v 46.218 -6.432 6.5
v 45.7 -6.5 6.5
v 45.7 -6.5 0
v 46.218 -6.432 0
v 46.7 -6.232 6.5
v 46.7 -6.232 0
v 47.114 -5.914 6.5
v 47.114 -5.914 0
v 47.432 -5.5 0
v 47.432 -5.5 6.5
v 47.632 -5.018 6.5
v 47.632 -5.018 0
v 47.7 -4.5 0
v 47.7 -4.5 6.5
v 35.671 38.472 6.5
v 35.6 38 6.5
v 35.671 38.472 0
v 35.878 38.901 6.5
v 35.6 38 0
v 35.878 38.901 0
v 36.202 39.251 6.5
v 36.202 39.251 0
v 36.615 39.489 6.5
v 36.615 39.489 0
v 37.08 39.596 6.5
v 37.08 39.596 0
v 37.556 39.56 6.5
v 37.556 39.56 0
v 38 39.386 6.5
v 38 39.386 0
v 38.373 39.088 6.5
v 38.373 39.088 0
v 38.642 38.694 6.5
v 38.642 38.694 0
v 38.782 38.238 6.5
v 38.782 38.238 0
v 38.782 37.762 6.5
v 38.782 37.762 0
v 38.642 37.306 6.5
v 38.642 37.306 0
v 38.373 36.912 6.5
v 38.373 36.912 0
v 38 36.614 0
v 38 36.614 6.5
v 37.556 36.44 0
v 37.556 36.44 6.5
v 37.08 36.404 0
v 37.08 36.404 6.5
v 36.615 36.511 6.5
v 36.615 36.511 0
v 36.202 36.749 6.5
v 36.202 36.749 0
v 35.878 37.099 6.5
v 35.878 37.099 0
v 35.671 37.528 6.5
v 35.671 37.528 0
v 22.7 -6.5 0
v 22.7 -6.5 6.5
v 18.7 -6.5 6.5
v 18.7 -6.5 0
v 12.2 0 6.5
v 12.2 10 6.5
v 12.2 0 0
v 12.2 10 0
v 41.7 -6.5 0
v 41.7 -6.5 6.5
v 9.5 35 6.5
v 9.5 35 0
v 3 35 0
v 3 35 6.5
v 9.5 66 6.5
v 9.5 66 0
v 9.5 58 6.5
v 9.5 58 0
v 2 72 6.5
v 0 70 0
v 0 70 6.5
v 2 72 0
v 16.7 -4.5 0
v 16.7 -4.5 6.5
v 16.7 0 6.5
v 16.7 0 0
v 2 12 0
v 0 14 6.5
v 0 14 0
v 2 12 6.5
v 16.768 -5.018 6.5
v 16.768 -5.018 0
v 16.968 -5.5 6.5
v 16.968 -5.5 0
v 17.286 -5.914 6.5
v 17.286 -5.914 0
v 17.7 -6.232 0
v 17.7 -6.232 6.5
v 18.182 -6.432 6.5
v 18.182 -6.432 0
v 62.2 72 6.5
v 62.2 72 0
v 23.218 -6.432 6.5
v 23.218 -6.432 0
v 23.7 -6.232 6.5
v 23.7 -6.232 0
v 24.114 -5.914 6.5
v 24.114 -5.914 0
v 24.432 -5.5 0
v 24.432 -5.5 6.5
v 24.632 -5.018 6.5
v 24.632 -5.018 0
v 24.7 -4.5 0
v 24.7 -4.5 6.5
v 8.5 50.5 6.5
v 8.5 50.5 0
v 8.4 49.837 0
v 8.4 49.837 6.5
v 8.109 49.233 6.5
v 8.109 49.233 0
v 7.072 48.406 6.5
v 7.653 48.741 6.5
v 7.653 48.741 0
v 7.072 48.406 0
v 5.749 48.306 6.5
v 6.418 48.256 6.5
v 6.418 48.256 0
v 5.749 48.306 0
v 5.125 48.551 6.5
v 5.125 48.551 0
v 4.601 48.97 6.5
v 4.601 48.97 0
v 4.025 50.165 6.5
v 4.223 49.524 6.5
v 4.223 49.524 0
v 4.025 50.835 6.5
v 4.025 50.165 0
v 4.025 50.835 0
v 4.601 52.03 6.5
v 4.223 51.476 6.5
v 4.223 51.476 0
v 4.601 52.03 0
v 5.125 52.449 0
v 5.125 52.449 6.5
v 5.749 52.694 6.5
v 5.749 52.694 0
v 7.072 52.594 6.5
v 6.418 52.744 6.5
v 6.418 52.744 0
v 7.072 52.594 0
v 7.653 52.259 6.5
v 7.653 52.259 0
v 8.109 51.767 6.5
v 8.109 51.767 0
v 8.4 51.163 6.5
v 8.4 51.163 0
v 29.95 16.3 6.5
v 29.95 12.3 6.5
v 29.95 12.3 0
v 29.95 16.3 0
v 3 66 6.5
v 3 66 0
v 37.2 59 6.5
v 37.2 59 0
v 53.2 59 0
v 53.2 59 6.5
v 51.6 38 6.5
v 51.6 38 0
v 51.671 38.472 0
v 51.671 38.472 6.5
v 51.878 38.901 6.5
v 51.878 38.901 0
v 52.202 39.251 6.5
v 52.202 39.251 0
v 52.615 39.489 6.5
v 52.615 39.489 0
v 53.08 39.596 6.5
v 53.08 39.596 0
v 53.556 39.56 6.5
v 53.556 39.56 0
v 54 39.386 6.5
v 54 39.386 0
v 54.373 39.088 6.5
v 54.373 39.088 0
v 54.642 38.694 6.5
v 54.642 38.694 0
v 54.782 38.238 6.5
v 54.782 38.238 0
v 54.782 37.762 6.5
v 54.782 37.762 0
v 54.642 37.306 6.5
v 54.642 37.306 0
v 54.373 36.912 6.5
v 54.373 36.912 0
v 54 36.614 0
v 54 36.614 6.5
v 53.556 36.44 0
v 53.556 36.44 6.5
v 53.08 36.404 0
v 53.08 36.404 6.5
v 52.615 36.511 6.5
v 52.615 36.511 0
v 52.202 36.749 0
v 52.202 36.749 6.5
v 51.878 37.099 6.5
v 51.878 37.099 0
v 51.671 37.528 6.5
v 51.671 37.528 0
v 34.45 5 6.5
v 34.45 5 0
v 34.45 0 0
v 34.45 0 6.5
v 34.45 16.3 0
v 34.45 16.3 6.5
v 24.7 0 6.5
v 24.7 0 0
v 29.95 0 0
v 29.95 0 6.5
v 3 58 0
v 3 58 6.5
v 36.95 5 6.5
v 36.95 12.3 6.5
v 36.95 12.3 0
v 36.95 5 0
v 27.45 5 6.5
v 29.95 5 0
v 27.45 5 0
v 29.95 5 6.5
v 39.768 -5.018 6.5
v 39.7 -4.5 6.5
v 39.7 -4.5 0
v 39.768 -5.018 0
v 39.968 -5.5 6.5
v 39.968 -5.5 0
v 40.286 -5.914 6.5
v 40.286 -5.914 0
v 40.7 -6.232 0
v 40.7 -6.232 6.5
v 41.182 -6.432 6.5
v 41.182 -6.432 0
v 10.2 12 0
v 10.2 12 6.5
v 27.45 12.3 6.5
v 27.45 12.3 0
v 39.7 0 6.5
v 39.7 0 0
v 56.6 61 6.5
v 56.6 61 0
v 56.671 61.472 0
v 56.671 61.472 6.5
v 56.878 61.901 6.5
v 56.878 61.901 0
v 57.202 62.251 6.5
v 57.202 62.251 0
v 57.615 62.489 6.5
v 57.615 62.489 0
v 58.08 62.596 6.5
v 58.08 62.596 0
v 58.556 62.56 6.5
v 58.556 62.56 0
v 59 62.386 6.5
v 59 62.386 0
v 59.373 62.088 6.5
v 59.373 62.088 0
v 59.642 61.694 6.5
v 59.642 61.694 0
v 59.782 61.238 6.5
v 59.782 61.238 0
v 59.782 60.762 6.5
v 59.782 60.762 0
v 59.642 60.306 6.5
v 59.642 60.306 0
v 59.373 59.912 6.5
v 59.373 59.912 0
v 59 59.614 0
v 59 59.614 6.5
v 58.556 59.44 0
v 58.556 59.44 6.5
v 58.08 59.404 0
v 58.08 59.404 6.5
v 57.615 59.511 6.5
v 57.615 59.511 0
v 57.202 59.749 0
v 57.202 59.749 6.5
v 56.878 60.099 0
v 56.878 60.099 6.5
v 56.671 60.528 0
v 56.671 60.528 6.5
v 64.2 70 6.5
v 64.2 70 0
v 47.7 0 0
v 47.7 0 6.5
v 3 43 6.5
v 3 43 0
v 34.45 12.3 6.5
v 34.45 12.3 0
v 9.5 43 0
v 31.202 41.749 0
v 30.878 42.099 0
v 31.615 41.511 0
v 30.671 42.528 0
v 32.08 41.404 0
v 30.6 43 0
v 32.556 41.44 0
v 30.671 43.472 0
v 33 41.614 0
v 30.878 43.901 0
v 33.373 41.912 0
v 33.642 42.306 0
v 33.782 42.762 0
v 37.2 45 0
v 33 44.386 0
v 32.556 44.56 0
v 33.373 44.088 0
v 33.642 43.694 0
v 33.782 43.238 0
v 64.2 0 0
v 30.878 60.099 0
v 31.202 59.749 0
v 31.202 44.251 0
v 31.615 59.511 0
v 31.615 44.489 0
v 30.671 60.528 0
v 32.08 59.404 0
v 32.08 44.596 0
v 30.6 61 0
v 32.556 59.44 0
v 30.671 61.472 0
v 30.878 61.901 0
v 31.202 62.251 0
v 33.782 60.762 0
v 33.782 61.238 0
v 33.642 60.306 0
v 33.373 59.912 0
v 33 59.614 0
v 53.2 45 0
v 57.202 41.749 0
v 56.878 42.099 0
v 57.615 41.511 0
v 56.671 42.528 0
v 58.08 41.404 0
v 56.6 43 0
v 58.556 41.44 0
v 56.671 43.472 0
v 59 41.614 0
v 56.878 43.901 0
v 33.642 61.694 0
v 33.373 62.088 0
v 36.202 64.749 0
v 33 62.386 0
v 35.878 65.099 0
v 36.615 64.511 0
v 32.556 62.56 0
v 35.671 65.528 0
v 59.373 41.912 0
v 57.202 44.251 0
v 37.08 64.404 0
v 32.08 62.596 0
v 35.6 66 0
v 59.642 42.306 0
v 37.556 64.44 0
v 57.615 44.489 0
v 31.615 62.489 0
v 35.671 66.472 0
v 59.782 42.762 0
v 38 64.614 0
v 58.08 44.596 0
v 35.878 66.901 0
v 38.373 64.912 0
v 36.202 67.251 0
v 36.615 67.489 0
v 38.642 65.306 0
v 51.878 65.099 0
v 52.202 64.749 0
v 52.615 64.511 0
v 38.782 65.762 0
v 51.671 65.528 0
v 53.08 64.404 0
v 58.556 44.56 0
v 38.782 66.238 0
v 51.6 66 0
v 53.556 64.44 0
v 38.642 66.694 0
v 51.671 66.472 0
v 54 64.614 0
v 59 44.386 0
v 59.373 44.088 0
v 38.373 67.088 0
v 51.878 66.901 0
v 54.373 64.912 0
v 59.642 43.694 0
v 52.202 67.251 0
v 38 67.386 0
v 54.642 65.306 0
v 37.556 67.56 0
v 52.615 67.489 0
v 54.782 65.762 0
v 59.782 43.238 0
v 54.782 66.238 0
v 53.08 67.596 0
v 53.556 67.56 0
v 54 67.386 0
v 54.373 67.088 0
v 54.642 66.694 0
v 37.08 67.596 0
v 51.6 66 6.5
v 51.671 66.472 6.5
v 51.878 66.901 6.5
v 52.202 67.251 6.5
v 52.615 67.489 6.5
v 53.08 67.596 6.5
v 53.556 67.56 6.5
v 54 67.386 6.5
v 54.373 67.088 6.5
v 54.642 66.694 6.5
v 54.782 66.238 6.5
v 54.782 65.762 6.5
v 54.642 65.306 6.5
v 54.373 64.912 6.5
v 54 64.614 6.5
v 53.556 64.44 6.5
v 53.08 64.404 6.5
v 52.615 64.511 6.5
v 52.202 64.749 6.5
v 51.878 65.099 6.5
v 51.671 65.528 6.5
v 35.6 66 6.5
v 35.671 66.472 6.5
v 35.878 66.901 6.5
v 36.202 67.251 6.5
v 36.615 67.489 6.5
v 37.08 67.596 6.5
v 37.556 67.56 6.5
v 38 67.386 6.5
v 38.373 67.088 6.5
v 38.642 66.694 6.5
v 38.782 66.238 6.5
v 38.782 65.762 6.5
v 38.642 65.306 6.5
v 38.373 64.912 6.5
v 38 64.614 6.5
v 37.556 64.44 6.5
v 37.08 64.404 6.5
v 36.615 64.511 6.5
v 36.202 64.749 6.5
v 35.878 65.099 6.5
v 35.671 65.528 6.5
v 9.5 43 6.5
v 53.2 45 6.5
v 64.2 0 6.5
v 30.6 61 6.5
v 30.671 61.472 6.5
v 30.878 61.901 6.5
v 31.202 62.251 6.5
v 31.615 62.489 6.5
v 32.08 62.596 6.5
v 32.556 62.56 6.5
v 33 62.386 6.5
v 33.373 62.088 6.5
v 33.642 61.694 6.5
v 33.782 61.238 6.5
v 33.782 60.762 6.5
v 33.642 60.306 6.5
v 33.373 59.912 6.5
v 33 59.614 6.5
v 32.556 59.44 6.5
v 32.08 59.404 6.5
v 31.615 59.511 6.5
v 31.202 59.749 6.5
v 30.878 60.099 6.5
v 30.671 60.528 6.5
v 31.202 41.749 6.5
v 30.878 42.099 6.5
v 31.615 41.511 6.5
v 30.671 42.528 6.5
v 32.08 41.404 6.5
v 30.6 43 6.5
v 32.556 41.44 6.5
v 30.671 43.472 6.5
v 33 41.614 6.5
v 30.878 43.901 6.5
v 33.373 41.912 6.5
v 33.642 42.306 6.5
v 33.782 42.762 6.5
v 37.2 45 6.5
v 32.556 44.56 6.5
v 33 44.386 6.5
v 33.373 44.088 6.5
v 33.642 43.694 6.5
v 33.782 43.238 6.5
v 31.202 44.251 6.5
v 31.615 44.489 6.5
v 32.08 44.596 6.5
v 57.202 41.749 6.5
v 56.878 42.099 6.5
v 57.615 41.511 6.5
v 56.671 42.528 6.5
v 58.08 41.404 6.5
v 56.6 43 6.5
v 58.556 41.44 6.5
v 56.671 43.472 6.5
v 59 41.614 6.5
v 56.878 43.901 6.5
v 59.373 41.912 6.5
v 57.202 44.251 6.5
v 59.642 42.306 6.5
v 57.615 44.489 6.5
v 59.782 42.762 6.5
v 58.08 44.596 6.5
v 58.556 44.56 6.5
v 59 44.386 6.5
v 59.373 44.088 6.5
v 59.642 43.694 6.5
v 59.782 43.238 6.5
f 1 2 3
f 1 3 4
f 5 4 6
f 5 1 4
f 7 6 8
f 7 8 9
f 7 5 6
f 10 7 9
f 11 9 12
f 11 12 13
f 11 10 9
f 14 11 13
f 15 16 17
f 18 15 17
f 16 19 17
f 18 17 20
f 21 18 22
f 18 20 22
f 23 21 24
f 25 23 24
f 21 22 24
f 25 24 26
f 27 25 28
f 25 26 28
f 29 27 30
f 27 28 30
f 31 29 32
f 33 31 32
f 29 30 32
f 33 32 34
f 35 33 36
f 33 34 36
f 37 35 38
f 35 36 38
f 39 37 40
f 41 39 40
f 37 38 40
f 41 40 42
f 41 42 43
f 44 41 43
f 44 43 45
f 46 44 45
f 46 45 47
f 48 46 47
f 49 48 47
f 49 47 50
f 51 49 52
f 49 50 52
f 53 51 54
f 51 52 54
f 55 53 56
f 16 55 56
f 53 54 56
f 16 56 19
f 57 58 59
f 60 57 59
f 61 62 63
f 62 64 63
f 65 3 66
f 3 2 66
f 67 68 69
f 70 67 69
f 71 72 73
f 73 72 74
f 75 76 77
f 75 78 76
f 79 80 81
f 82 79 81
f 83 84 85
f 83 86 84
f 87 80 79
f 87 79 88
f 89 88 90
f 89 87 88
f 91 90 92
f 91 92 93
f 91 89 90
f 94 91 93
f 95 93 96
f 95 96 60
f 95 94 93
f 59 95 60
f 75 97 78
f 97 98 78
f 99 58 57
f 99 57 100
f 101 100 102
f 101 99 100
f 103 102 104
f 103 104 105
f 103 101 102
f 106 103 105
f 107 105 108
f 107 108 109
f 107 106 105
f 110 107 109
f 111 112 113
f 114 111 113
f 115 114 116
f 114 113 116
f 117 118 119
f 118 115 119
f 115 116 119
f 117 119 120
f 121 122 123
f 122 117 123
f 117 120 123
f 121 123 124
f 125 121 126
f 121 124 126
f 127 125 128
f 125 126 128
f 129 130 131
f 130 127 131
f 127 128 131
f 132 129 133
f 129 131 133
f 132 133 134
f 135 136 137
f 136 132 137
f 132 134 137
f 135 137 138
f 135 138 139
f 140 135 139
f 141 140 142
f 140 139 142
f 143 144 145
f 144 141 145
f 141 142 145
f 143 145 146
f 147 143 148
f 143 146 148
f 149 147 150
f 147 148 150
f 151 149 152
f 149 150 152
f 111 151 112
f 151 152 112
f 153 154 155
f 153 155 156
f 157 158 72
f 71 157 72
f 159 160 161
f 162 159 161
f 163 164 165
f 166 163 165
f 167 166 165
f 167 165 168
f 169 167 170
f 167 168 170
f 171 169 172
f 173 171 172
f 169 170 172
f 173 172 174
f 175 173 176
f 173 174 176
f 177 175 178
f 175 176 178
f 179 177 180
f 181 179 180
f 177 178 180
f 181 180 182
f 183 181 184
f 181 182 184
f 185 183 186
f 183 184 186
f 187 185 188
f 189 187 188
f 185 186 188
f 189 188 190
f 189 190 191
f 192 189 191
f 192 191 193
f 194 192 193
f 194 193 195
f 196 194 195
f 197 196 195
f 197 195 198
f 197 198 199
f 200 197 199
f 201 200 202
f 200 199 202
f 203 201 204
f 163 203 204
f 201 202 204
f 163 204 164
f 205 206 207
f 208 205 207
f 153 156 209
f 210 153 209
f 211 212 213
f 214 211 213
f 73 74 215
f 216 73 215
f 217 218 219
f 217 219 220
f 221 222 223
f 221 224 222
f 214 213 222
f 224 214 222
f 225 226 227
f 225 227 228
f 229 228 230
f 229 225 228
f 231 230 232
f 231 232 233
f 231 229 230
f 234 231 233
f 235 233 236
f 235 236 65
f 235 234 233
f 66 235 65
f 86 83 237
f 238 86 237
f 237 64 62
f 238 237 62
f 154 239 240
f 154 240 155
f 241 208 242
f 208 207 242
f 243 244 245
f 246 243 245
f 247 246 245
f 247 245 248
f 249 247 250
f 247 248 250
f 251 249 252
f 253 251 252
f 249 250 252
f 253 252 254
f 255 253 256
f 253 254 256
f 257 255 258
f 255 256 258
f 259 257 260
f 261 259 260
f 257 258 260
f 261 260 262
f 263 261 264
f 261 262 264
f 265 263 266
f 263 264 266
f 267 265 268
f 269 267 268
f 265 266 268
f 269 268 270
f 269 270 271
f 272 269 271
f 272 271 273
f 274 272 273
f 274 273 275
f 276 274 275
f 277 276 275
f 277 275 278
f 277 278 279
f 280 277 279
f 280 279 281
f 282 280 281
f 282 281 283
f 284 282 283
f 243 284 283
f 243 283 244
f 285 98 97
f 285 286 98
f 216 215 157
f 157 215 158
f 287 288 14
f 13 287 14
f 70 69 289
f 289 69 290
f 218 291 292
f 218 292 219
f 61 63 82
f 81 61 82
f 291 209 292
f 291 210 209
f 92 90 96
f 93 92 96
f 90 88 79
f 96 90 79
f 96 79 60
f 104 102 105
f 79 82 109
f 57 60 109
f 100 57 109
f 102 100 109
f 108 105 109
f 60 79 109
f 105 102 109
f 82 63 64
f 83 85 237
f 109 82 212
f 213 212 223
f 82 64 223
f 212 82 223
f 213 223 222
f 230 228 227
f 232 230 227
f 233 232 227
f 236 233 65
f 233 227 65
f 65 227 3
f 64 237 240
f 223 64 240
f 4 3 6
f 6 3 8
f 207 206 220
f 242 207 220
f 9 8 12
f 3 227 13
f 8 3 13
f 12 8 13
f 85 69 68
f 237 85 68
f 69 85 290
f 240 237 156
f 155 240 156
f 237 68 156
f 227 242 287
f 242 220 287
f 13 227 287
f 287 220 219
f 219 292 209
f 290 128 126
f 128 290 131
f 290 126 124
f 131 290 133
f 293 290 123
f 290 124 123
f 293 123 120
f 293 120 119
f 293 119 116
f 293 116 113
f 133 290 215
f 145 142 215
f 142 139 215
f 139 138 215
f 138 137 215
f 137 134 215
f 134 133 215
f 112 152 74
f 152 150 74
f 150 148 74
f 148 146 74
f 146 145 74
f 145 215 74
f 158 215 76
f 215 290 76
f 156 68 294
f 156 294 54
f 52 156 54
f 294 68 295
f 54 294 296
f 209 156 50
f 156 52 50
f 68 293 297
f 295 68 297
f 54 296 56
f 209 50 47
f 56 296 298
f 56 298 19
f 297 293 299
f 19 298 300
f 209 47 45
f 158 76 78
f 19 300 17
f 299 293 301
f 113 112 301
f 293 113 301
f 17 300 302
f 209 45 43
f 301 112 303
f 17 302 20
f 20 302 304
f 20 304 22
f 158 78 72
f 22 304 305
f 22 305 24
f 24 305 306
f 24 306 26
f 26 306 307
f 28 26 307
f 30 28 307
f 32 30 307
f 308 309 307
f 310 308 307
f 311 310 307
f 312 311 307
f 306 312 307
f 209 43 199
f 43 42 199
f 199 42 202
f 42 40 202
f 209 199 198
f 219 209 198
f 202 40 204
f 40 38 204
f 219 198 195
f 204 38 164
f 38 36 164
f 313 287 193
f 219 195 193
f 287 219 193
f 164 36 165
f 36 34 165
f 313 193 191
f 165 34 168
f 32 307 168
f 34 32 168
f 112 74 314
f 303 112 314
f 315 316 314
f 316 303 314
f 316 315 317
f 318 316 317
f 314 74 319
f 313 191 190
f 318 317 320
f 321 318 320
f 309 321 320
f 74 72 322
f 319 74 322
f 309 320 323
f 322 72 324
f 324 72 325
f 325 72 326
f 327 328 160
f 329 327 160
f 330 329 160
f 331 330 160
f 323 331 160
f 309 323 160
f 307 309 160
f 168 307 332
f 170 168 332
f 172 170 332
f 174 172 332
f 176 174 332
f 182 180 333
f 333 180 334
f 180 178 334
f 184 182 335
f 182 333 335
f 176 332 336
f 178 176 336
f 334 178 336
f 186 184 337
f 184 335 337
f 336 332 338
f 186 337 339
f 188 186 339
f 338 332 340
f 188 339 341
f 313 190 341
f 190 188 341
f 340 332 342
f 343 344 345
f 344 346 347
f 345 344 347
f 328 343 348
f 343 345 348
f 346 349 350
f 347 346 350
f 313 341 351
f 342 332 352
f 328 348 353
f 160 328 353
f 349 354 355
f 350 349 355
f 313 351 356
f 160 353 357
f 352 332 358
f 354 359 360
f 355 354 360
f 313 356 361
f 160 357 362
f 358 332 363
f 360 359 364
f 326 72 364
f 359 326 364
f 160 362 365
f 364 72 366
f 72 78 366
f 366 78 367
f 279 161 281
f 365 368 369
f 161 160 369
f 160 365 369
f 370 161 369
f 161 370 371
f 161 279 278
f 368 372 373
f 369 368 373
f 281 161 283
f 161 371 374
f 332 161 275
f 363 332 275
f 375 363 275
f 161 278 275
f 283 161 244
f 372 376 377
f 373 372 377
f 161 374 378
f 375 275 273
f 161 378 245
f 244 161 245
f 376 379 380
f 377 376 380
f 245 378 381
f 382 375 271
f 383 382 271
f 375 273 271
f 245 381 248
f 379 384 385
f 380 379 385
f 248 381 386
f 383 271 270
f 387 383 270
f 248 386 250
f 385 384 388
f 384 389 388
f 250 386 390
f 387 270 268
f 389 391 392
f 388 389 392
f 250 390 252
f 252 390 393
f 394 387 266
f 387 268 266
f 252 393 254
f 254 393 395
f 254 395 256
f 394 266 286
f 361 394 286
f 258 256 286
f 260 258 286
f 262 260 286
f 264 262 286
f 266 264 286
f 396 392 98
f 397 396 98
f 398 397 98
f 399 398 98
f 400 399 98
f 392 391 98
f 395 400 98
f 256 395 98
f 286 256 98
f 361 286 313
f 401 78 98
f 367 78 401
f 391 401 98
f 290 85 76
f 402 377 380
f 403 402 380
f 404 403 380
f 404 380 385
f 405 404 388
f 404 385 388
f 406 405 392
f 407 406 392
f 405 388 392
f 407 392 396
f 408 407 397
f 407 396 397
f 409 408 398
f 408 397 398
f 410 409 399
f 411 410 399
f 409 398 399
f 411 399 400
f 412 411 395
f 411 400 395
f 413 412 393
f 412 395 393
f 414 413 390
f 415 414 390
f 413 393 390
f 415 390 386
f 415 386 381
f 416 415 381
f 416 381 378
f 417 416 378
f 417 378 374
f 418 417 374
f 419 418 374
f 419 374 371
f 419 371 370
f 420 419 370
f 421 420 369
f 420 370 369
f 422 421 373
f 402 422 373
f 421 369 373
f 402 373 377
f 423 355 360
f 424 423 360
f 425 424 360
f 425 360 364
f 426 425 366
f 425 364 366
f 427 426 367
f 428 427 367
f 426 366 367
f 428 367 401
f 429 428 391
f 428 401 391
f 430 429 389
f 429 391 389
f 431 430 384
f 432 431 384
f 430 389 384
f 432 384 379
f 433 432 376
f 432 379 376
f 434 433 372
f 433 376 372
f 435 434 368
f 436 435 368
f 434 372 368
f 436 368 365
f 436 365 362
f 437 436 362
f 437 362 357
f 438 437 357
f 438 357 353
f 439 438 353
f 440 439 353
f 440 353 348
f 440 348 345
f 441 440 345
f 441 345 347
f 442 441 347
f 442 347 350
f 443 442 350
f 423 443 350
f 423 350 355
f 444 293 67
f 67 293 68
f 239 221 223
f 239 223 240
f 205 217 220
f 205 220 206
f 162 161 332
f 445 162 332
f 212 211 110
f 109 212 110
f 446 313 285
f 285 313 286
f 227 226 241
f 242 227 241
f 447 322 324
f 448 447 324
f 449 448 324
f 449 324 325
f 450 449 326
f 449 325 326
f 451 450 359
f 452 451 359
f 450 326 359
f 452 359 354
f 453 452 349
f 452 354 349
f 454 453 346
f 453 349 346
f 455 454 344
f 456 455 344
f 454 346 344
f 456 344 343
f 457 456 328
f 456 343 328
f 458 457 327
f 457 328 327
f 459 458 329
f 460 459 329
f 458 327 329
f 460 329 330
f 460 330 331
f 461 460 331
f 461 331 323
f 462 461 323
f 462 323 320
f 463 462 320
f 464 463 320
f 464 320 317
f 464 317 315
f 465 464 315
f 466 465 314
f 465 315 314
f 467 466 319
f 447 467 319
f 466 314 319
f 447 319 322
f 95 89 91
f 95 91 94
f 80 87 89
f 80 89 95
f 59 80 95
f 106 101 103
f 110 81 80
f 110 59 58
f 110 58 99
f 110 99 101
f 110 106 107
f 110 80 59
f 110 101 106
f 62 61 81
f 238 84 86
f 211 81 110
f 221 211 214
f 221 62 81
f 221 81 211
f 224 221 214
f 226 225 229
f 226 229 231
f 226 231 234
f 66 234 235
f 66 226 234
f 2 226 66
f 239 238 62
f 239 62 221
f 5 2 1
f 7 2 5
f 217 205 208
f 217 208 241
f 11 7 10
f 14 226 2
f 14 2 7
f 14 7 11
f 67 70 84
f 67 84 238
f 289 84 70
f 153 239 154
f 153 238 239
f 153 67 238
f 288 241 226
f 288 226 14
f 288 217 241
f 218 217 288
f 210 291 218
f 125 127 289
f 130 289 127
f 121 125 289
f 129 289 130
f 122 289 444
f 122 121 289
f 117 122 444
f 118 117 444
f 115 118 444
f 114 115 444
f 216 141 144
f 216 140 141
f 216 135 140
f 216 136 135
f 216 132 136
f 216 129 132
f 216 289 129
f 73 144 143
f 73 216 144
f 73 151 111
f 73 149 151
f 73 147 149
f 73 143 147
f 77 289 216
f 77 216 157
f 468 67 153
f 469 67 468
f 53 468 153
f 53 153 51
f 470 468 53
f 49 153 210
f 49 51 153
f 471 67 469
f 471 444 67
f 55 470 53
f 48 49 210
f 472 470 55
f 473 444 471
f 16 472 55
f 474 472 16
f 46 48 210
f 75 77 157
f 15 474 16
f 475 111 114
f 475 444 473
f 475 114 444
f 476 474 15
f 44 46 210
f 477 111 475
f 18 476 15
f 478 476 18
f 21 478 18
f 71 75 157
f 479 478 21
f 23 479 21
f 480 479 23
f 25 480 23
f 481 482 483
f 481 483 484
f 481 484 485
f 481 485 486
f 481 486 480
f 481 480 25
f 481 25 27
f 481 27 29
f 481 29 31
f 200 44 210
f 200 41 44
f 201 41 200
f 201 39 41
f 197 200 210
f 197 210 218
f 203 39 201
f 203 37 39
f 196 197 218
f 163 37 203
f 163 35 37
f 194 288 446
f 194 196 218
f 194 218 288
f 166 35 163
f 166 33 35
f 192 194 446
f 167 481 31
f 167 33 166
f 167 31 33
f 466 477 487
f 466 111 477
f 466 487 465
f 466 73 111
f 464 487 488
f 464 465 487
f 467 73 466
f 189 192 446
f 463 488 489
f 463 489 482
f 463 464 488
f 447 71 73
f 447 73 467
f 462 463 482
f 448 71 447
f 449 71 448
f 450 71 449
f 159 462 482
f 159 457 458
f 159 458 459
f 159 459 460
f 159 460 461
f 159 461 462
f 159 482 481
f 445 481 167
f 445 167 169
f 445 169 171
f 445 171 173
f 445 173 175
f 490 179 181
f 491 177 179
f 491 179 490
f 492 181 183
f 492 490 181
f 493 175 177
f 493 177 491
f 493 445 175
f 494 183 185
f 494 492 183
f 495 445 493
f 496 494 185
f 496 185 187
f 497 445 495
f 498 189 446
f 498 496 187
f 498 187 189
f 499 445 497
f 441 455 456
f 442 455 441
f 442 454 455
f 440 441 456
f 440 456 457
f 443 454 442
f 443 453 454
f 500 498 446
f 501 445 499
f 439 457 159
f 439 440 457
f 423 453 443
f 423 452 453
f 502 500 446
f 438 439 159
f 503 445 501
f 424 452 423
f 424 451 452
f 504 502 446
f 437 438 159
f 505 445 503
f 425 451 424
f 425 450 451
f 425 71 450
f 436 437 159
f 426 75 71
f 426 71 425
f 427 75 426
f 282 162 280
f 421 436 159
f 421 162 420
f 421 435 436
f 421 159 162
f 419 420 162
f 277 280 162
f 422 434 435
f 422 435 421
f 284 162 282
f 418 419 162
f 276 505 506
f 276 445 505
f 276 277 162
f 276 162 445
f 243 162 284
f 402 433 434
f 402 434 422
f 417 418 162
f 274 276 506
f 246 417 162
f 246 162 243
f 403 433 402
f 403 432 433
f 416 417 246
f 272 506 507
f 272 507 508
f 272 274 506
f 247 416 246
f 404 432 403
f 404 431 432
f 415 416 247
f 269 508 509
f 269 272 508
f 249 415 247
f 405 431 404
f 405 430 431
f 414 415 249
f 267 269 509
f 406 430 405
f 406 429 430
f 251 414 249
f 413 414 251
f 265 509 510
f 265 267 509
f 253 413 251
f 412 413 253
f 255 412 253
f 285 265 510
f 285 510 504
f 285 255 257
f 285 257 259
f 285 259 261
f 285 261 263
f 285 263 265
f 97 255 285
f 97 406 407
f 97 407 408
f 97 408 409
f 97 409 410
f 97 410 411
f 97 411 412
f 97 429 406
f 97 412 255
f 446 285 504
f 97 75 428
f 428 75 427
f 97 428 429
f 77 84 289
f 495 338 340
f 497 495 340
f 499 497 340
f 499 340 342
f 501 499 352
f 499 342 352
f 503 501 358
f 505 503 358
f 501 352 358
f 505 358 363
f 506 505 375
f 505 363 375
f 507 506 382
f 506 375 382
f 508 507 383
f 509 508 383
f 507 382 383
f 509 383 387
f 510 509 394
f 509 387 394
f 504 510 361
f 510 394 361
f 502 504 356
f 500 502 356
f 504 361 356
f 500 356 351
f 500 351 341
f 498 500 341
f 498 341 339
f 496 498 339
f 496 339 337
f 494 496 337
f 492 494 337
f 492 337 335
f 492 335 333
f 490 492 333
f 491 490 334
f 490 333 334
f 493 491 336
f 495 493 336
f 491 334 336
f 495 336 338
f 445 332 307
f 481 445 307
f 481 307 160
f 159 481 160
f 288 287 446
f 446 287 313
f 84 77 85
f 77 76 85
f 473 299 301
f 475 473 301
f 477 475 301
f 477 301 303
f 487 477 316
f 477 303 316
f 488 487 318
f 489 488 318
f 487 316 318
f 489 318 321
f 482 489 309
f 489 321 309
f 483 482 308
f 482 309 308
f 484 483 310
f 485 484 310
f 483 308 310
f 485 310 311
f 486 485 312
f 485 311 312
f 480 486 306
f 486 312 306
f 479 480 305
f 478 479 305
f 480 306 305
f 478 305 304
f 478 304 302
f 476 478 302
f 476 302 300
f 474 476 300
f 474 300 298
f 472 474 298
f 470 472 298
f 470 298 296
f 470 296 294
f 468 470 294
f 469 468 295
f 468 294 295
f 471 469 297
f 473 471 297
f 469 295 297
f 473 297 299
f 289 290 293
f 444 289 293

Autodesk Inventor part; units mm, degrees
ref_plane "YZ Plane" through (0, 0, 0) normal (1, 0, 0) x (0, 1, 0)
ref_plane "XZ Plane" through (0, 0, 0) normal (0, 1, 0) x (-1, 0, 0)
ref_plane "XY Plane" through (0, 0, 0) normal (0, 0, 1) x (1, 0, 0)
sketch "Sketch1" plane through (0, 0, 0) normal (0, 0, 1) x (1, 0, 0)
  line L0 (12.2, 0) -> (64.2, 0)
  line L1 (64.2, 0) -> (64.2, 72)
  line L2 (64.2, 72) -> (0, 72)
  line L3 (0, 72) -> (0, 12)
  line L4 (3, 66) -> (9.5, 66)
  line L5 (9.5, 66) -> (9.5, 58)
  line L6 (9.5, 58) -> (3, 58)
  line L7 (3, 58) -> (3, 66)
  line L8 (3, 43) -> (9.5, 43)
  line L9 (9.5, 43) -> (9.5, 35)
  line L10 (9.5, 35) -> (3, 35)
  line L11 (3, 35) -> (3, 43)
  line L12 (0, 12) -> (12.2, 12)
  line L13 (12.2, 12) -> (12.2, 0)
  line L14 (3, 58) -> (9.5, 43) construction
  line L15 (3, 43) -> (9.5, 58) construction
  circle A0 centre (6.25, 50.5) radius 2.25
  point P0 (0, 0)
  dimension "d1" = 6.5
  dimension "d2" = 8
  dimension "d3" = 8
  dimension "d4" = 15
  dimension "d5" = 3
  dimension "d6" = 72
  dimension "d7" = 4.5
  dimension "d8" = 64.2
  dimension "d9" = 12
  dimension "d10" = 52
  dimension "d11" = 6
extrude "Extrusion1" add sketch "Sketch1" along normal blind 6.5
sketch "Sketch2" plane through (0, 0, 6.5) normal (0, 0, 1) x (1, 0, 0)
  line L0 (64.2, 0) -> (64.2, 72) projected
  line L1 (12.2, 0) -> (64.2, 0) projected
  line L2 (29.95, 16.3) -> (34.45, 16.3)
  line L3 (34.45, 0) -> (29.95, 0)
  line L4 (36.95, 12.3) -> (36.95, 5)
  line L5 (27.45, 5) -> (27.45, 12.3)
  line L6 (29.95, 0) -> (29.95, 5)
  line L7 (29.95, 12.3) -> (29.95, 16.3)
  line L8 (27.45, 12.3) -> (29.95, 12.3)
  line L9 (34.45, 12.3) -> (36.95, 12.3)
  line L10 (34.45, 16.3) -> (34.45, 12.3)
  line L11 (34.45, 5) -> (34.45, 0)
  line L12 (36.95, 5) -> (34.45, 5)
  line L13 (29.95, 5) -> (27.45, 5)
  point P0 (0, 0)
  point P1 (32.2, 16.3)
  dimension "d14" = 2.5
  dimension "d15" = 2.5
  dimension "d16" = 4.5
  dimension "d17" = 5
  dimension "d18" = 7.3
  dimension "d19" = 4
  dimension "d20" = 32
extrude "Extrusion2" cut sketch "Sketch2" against normal blind 6.5
sketch "Sketch3" plane through (0, 0, 6.5) normal (0, 0, 1) x (1, 0, 0)
  line L0 (34.45, 0) -> (64.2, 0) projected
  line L1 (12.2, 0) -> (29.95, 0) projected
  line L2 (29.95, 16.3) -> (34.45, 16.3) projected
  line L3 (16.7, 0) -> (24.7, 0)
  line L4 (24.7, 0) -> (24.7, -4.5)
  line L5 (22.7, -6.5) -> (18.7, -6.5)
  line L6 (16.7, -4.5) -> (16.7, 0)
  line L7 (39.7, 0) -> (47.7, 0)
  line L8 (47.7, 0) -> (47.7, -4.5)
  line L9 (45.7, -6.5) -> (41.7, -6.5)
  line L10 (39.7, -4.5) -> (39.7, 0)
  arc A0 (16.7, -4.5) -> (18.7, -6.5) centre (18.7, -4.5) ccw
  arc A1 (22.7, -6.5) -> (24.7, -4.5) centre (22.7, -4.5) ccw
  arc A2 (39.7, -4.5) -> (41.7, -6.5) centre (41.7, -4.5) ccw
  arc A3 (45.7, -6.5) -> (47.7, -4.5) centre (45.7, -4.5) ccw
  point P0 (0, 0)
  point P1 (32.2, 16.3)
  dimension "d23" = 2
  dimension "d24" = 8
  dimension "d25" = 8
  dimension "d26" = 6.5
  dimension "d27" = 15
  dimension "d28" = 7.5
extrude "Extrusion3" add sketch "Sketch3" against normal blind 6.5
chamfer "Chamfer1" distance 2 angle 45 2 edges at (0, 72, 3.25) (64.2, 72, 3.25)
sketch "Sketch4" plane through (0, 0, 0) normal (0, 0, -1) x (-1, 0, 0)
  line L0 (-64.2, 70) -> (-64.2, 0) projected
  line L1 (-2, 72) -> (-62.2, 72) projected
  line L2 (-37.2, 59) -> (-53.2, 59)
  line L3 (-53.2, 59) -> (-53.2, 45)
  line L4 (-53.2, 45) -> (-37.2, 45)
  line L5 (-37.2, 45) -> (-37.2, 59)
  line L6 (-32.2, 66) -> (-58.2, 66) construction
  line L7 (-58.2, 66) -> (-58.2, 38) construction
  line L8 (-58.2, 38) -> (-32.2, 38) construction
  line L9 (-32.2, 38) -> (-32.2, 66) construction
  circle A0 centre (-58.2, 61) radius 1.6
  circle A1 centre (-58.2, 43) radius 1.6
  circle A2 centre (-53.2, 38) radius 1.6
  circle A3 centre (-37.2, 38) radius 1.6
  circle A4 centre (-32.2, 43) radius 1.6
  circle A5 centre (-32.2, 61) radius 1.6
  circle A6 centre (-37.2, 66) radius 1.6
  circle A7 centre (-53.2, 66) radius 1.6
  point P0 (0, 0)
  point P1 (-58.2, 52)
  point P2 (-53.2, 52)
  point P3 (-45.2, 38)
  point P4 (-45.2, 45)
  dimension "d34" = 3.2
  dimension "d35" = 5
  dimension "d36" = 5
  dimension "d37" = 5
  dimension "d38" = 5
  dimension "d39" = 5
  dimension "d40" = 5
  dimension "d41" = 5
  dimension "d42" = 5
  dimension "d43" = 16
  dimension "d44" = 14
  dimension "d45" = 5
  dimension "d46" = 7
  dimension "d47" = 6
  dimension "d48" = 6
extrude "Extrusion4" cut sketch "Sketch4" against normal through all
chamfer "Chamfer2" distance 2 angle 45 2 edges at (0, 12, 3.25) (12.2, 12, 3.25)
equation "\"d36\" = d35"
equation "\"d37\" = d35"
equation "\"d38\" = d35"
equation "\"d39\" = d35"
equation "\"d40\" = d35"
equation "\"d41\" = d35"
equation "\"d42\" = d35"
properties part number "x_motor_cable_mount" material "Plywood, Finish"
